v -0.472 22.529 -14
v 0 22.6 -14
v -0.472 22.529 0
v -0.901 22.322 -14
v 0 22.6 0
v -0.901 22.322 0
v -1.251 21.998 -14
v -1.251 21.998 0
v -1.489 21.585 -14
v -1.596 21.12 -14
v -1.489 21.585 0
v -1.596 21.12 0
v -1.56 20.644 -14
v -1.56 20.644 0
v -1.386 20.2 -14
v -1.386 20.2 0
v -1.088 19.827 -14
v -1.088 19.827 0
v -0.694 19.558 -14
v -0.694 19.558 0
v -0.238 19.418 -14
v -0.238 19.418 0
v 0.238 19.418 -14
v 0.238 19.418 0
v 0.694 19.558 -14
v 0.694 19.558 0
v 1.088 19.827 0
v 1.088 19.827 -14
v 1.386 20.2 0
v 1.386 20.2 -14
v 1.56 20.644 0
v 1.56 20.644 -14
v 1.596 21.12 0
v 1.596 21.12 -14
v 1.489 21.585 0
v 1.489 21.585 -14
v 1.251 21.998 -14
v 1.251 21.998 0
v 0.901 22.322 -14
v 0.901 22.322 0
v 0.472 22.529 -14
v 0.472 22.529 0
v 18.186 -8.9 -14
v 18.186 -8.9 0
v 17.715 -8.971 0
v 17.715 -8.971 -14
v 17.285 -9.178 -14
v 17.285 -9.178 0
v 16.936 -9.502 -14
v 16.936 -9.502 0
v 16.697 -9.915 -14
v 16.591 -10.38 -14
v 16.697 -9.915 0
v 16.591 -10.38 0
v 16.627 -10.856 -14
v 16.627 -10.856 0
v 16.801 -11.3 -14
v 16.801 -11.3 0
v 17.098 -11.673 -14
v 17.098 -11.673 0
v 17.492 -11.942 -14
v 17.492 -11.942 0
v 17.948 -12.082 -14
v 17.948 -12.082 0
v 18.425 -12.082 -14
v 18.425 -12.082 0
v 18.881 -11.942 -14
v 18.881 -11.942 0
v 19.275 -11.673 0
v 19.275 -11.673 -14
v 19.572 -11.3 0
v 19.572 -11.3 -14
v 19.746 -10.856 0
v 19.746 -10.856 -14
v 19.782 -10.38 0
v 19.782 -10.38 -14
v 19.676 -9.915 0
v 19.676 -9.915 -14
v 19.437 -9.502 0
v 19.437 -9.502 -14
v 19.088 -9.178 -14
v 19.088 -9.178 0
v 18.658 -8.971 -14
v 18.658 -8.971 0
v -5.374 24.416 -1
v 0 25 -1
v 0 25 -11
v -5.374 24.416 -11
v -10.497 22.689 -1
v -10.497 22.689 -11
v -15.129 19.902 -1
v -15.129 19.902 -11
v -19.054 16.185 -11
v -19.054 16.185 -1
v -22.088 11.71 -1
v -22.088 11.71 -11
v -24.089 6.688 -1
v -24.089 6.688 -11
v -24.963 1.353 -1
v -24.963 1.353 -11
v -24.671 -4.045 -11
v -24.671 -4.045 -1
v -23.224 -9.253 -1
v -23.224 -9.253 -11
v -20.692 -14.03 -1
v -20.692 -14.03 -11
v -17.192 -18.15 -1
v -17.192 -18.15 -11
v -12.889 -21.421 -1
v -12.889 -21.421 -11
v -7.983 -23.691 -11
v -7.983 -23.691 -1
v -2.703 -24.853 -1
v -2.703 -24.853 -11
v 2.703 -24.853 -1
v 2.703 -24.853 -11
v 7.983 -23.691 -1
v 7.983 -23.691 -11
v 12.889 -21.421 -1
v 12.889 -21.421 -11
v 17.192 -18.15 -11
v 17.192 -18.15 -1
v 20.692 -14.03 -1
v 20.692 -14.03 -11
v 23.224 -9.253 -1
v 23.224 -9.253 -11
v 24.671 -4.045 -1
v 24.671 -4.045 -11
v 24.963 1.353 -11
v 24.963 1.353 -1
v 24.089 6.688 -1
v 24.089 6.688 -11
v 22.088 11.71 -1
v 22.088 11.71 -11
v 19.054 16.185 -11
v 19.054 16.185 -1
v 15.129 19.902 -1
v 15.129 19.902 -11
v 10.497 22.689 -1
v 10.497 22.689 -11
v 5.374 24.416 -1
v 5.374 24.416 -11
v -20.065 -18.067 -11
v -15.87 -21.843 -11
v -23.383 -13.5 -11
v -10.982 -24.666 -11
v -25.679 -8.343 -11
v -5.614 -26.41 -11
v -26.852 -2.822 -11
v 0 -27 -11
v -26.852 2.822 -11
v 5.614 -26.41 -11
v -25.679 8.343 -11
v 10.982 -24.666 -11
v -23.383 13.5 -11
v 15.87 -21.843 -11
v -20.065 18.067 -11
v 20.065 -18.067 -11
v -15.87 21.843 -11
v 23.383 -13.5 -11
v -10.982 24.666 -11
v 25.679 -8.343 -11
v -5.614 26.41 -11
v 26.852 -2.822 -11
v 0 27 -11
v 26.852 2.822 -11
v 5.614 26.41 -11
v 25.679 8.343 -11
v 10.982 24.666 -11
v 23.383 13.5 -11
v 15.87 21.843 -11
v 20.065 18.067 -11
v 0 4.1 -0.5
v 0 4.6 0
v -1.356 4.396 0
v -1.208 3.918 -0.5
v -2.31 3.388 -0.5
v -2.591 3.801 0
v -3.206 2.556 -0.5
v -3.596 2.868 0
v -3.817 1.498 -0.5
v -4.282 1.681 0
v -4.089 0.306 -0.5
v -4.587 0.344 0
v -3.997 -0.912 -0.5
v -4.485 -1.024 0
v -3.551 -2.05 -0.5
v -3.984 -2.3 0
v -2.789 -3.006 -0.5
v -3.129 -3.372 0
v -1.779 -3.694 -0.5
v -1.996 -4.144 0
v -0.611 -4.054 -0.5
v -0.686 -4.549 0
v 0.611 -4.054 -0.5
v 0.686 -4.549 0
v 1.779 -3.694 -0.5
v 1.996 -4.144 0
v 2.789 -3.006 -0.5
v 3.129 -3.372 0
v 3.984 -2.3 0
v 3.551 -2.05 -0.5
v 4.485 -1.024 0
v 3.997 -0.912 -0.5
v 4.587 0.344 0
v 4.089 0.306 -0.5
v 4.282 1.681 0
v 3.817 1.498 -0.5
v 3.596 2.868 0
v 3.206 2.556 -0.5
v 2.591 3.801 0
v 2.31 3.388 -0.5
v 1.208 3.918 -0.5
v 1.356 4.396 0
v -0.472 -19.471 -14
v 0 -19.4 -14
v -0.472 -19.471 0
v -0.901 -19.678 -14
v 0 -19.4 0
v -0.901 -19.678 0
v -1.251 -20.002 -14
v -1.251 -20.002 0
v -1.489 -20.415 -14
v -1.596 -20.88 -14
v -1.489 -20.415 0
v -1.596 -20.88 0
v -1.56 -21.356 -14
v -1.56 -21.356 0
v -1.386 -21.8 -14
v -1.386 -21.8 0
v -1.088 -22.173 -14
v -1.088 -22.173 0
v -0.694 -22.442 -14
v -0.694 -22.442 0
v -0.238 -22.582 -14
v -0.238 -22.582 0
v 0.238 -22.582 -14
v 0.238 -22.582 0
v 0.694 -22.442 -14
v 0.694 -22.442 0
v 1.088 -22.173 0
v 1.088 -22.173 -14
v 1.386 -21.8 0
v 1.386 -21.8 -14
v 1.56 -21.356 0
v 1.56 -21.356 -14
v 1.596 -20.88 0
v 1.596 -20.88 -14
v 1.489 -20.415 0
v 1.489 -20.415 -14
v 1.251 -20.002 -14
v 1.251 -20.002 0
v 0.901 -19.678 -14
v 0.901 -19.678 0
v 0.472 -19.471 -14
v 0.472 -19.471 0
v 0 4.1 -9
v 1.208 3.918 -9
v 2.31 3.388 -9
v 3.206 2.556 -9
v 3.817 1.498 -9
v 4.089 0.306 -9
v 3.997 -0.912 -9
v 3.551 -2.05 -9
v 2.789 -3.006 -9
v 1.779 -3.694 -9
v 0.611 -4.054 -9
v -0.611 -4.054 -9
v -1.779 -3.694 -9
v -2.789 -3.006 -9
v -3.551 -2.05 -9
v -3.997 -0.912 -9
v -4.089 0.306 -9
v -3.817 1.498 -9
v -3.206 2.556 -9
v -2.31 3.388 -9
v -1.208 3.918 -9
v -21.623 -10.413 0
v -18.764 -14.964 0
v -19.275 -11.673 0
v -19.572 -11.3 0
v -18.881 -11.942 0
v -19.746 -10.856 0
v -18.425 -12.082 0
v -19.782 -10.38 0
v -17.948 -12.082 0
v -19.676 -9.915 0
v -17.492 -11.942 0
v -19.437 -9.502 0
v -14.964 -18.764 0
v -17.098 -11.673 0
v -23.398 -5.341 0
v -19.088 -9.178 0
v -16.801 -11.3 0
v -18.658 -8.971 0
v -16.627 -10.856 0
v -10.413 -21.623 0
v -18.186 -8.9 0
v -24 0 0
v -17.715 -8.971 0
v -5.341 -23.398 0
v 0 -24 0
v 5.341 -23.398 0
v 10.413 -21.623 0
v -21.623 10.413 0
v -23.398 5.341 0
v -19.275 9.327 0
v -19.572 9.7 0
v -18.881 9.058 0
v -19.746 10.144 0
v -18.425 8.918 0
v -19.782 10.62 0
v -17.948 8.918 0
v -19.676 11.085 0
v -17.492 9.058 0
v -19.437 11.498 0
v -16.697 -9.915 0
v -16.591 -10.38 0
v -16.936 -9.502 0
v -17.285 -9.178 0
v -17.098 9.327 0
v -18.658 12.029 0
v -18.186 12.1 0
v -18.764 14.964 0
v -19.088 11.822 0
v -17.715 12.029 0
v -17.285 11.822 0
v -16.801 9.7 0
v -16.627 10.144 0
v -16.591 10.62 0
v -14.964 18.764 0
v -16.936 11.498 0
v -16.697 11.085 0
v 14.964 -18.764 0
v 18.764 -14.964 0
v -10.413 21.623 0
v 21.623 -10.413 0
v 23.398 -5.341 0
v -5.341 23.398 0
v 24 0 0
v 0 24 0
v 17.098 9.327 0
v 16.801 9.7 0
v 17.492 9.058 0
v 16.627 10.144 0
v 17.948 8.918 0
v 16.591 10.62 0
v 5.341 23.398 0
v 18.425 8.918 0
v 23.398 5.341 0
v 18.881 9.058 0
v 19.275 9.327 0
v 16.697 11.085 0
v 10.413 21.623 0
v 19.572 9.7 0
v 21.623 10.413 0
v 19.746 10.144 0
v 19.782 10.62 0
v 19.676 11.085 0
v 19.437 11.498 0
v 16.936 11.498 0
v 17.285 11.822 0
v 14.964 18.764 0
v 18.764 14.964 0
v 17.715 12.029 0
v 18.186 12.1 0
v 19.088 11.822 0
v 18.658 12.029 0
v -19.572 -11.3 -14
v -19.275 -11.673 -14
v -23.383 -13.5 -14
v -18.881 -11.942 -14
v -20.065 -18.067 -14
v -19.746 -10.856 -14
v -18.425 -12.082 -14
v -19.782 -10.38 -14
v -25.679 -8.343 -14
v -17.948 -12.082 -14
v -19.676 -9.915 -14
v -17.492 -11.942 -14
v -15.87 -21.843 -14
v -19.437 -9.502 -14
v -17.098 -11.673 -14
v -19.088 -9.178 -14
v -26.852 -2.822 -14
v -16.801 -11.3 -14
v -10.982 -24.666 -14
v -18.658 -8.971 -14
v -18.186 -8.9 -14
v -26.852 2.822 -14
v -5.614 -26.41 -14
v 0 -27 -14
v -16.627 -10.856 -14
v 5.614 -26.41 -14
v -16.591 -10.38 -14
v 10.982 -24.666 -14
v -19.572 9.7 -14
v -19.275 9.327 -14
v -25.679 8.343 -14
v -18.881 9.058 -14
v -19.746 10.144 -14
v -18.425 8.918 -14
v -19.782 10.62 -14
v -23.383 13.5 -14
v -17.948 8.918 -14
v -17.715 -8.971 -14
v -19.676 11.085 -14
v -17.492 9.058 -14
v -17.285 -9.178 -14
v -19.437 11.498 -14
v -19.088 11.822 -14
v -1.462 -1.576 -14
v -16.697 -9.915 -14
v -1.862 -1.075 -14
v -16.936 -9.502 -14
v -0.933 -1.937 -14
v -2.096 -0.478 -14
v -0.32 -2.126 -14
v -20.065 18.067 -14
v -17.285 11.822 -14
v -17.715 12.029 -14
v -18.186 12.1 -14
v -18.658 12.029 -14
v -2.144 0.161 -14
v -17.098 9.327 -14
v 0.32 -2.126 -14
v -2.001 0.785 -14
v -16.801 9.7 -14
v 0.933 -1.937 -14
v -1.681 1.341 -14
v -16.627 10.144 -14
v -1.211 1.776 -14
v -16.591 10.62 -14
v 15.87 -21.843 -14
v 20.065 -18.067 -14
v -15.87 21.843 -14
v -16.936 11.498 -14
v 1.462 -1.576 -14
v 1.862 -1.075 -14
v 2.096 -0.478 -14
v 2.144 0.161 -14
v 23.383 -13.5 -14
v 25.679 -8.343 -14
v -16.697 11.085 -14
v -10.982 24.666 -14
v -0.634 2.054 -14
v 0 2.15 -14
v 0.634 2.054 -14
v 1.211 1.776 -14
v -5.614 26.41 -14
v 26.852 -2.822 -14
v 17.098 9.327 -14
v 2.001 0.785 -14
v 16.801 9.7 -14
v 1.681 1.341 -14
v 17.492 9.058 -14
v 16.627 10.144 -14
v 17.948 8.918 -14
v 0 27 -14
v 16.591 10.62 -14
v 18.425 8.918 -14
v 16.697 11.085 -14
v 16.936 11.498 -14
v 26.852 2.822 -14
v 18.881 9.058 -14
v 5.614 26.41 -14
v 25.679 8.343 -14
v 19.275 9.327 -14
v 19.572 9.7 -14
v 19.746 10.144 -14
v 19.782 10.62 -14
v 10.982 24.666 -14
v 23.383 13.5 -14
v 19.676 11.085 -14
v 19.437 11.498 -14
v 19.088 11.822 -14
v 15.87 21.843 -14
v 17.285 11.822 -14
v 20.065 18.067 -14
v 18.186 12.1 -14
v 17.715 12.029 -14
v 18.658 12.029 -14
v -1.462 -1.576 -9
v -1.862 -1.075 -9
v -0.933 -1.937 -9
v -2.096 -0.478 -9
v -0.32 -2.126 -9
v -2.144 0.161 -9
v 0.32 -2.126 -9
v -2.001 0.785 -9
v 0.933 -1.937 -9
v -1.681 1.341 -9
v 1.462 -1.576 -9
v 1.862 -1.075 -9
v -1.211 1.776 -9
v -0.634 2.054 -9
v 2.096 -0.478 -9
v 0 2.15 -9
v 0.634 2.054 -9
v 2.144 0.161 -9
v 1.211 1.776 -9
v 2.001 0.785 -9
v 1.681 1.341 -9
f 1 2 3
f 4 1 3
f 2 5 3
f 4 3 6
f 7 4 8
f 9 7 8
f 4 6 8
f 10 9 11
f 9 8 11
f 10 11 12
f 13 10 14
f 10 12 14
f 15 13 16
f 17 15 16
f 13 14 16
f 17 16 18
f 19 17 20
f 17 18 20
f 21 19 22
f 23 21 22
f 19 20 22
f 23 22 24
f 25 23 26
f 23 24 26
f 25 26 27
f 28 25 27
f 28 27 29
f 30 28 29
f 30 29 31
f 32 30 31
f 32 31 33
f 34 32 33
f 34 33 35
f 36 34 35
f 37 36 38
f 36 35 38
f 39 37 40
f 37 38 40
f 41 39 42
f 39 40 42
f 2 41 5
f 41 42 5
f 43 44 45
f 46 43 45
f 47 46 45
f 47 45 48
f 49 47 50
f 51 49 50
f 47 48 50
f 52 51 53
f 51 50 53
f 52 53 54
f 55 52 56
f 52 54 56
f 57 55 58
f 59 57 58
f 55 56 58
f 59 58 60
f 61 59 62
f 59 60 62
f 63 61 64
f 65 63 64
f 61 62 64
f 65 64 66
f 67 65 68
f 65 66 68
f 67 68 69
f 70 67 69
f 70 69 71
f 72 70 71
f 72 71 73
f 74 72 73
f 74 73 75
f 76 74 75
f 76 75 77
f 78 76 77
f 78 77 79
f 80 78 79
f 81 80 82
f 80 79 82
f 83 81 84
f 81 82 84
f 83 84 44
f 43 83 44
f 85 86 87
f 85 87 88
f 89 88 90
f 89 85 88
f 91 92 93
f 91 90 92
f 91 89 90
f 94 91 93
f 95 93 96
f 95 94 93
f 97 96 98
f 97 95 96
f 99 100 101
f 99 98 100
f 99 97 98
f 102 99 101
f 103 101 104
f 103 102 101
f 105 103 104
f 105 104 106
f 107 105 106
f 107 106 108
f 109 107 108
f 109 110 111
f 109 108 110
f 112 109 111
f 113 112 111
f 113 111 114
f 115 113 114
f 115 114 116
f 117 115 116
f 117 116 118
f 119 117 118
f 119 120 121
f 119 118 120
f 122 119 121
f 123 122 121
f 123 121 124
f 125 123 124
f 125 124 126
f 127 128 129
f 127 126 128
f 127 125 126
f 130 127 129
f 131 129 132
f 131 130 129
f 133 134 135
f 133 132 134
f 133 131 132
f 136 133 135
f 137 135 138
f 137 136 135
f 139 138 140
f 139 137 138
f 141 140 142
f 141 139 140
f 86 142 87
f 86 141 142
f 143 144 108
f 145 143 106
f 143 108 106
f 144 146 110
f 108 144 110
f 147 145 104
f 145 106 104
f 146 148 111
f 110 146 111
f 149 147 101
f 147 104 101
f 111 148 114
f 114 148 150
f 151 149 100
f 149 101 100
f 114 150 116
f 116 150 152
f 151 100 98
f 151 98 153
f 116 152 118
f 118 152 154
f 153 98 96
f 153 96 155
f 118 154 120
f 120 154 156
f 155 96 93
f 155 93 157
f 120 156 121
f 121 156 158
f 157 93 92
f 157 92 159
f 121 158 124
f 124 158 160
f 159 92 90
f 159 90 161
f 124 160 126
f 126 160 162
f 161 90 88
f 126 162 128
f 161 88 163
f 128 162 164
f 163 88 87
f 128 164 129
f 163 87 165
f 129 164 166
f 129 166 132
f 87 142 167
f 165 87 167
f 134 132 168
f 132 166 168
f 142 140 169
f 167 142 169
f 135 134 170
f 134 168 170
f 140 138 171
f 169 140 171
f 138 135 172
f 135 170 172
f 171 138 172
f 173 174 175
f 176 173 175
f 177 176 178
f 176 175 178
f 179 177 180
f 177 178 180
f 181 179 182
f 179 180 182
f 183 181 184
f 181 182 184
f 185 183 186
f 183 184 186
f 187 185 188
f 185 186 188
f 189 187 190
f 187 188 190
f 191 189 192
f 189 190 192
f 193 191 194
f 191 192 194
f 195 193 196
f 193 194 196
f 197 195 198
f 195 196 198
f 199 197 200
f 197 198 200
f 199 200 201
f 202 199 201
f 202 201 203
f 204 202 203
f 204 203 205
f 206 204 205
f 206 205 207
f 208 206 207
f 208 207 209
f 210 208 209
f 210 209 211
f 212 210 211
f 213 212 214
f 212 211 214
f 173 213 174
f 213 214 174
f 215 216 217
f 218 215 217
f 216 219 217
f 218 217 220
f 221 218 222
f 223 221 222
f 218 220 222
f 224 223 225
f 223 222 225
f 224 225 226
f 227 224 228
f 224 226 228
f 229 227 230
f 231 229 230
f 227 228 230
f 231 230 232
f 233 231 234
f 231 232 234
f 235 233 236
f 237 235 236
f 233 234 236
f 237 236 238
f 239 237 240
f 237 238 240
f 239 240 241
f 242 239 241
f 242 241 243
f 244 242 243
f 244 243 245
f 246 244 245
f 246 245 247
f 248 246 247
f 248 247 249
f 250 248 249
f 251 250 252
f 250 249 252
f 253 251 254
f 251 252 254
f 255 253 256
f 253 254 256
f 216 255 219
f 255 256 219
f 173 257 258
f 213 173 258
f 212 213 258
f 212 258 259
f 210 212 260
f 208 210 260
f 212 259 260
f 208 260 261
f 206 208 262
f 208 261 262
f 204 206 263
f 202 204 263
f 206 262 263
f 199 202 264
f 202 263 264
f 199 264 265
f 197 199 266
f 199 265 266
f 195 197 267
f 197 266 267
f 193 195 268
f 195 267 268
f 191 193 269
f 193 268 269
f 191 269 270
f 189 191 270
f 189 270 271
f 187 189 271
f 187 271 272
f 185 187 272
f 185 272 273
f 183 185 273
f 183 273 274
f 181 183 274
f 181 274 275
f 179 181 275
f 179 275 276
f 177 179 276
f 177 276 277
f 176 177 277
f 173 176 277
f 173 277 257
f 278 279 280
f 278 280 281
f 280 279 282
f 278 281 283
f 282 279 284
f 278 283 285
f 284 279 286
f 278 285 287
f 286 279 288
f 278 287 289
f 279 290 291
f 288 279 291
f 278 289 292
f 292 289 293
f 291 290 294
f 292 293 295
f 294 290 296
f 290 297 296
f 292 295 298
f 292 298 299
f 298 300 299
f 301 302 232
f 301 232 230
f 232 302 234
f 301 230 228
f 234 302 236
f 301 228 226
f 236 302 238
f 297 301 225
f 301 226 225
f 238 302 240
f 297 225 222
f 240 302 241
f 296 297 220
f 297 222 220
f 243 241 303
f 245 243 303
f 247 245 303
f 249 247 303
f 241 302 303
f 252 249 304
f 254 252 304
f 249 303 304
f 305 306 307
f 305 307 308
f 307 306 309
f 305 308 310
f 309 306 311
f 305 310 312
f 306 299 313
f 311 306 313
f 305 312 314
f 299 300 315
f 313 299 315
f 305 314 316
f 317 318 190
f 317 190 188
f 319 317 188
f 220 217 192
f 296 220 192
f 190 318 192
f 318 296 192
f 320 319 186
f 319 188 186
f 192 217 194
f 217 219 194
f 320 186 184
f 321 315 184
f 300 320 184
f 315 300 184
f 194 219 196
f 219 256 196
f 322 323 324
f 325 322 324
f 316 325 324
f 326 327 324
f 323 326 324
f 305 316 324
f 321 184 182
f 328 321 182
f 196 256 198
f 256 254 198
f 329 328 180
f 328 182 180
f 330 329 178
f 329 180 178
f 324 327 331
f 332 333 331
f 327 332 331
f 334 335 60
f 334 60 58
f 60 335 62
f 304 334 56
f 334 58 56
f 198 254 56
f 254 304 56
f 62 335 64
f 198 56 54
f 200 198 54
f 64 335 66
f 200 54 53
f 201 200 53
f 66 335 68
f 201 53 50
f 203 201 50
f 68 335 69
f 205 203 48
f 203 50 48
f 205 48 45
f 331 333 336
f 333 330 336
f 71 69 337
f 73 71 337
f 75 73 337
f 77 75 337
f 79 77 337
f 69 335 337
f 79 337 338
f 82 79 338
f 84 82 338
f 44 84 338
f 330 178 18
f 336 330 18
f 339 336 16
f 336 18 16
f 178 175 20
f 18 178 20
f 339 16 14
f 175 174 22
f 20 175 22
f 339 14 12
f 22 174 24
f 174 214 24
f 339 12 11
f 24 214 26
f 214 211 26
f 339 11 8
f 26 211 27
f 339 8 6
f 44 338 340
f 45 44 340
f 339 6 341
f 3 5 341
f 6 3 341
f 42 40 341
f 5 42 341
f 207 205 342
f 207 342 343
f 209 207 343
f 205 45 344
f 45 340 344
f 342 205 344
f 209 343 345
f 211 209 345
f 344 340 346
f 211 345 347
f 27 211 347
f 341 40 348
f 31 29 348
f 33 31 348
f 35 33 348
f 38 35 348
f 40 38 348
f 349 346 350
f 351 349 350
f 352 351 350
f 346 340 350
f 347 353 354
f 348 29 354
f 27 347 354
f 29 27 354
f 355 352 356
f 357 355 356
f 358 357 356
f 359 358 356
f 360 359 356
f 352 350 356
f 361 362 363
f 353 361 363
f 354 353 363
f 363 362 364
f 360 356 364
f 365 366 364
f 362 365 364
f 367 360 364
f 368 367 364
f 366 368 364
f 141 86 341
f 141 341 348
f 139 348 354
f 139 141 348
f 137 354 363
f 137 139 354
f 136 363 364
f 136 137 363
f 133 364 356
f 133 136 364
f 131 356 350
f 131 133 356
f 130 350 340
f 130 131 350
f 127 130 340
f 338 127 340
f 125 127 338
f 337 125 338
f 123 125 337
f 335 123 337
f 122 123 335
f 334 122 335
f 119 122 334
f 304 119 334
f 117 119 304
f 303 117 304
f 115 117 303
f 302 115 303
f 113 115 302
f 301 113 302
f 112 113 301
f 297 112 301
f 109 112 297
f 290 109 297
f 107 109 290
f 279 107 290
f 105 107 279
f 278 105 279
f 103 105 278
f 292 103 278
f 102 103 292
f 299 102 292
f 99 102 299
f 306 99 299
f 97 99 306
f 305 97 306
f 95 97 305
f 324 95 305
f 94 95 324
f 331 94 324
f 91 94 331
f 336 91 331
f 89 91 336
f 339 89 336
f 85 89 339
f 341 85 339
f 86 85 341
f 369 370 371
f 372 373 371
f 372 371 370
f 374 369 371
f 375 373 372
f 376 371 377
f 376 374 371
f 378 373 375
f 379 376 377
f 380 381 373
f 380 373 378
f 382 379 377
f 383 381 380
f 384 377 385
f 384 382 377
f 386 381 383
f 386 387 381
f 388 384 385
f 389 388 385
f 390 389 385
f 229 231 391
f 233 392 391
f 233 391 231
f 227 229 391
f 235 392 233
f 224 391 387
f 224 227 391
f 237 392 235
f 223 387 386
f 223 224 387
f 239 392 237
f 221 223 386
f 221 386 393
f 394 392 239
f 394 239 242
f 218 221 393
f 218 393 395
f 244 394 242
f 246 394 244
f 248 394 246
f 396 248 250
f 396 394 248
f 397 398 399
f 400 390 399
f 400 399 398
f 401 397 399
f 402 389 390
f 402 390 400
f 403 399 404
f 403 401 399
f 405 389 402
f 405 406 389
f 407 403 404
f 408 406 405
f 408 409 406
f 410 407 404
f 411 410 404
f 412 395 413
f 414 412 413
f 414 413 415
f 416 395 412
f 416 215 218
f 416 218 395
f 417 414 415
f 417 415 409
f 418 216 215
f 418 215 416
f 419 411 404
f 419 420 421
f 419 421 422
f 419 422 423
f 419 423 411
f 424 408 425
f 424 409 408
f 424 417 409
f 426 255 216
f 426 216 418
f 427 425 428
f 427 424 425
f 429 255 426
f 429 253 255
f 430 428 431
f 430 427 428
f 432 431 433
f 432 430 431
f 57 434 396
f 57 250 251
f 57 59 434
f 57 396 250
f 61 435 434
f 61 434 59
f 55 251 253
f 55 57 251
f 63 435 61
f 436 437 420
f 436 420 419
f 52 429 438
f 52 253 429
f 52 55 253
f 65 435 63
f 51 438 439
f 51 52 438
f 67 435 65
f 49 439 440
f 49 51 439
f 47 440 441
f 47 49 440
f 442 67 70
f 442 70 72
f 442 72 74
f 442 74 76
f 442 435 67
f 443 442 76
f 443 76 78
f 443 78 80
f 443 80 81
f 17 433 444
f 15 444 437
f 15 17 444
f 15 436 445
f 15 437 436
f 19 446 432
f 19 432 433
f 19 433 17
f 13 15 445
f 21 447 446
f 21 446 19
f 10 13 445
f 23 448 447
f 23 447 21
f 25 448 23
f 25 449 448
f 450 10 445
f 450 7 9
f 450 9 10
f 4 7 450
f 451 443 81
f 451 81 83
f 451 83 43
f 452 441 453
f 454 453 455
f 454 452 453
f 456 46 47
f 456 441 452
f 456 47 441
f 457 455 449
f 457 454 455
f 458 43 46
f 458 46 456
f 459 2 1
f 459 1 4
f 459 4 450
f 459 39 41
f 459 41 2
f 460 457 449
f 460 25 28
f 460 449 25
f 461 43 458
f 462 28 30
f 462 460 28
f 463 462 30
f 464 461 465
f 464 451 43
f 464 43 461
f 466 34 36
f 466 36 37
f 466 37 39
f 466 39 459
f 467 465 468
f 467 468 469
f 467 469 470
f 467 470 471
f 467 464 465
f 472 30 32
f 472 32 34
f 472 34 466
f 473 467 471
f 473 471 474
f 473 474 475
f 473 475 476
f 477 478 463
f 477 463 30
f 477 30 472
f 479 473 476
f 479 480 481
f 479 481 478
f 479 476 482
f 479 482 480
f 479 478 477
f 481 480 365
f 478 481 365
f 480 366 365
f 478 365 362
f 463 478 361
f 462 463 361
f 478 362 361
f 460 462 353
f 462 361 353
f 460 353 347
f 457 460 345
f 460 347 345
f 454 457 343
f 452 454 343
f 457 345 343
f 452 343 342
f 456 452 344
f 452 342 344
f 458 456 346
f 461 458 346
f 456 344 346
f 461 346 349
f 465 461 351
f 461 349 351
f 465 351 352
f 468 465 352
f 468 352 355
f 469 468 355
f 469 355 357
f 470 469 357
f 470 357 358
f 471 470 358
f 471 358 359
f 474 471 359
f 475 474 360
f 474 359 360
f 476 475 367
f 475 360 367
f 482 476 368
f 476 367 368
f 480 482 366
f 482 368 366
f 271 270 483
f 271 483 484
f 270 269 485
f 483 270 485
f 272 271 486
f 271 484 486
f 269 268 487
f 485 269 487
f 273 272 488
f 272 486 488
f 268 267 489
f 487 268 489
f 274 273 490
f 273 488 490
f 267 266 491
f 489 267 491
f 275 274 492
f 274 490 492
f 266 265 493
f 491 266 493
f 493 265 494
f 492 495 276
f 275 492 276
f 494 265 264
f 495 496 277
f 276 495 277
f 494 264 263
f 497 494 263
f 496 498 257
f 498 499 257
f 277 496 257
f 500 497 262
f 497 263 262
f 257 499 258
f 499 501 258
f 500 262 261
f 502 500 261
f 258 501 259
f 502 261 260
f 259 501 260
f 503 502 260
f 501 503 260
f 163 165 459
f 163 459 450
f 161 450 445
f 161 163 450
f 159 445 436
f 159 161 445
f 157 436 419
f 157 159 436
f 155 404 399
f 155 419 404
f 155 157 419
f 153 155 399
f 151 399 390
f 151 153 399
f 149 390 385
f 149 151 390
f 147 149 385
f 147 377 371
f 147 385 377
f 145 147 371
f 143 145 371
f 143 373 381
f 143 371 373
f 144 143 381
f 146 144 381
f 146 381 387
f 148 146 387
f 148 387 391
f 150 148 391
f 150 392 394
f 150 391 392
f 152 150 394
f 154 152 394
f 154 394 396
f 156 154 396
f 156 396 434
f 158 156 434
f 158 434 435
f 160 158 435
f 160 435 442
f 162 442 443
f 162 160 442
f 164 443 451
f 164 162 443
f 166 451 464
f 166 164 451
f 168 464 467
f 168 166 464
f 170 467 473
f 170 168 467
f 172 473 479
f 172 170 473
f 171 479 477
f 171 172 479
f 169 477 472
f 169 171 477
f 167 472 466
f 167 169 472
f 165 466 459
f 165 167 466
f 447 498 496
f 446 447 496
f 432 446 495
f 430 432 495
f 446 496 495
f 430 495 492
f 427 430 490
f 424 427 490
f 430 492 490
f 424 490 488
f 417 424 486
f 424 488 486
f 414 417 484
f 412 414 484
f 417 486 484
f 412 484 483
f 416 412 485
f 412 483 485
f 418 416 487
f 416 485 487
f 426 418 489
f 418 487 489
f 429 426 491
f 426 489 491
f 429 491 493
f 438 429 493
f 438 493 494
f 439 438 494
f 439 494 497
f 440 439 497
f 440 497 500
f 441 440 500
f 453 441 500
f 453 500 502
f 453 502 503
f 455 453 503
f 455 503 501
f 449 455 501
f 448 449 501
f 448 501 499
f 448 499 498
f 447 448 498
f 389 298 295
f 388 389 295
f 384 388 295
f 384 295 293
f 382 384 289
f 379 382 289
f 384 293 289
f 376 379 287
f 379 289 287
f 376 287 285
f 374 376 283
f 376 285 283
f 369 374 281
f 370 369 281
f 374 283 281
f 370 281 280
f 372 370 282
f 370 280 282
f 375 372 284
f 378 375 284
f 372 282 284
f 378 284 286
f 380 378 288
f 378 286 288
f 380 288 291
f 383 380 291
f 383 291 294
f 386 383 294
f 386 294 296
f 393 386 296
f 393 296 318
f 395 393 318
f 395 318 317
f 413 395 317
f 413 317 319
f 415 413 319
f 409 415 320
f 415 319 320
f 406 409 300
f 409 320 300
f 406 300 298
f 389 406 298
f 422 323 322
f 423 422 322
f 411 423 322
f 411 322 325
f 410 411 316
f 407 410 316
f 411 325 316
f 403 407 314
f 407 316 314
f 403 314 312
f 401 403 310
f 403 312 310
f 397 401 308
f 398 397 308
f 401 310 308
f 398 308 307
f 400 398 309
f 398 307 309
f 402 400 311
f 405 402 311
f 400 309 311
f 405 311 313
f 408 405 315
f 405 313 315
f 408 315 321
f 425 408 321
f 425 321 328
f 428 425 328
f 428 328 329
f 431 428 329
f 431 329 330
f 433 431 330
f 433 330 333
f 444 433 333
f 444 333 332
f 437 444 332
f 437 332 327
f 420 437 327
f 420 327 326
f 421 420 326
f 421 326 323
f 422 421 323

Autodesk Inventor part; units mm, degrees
ref_plane "YZ Plane" through (0, 0, 0) normal (1, 0, 0) x (0, 1, 0)
ref_plane "XZ Plane" through (0, 0, 0) normal (0, 1, 0) x (-1, 0, 0)
ref_plane "XY Plane" through (0, 0, 0) normal (0, 0, 1) x (1, 0, 0)
sketch "スケッチ1" plane through (0, 0, 0) normal (1, 0, 0) x (0, 1, 0)
  line L0 (7, 0) -> (7, 0)
  line L1 (0, -9) -> (0, -14)
  line L2 (0, -14) -> (27, -14)
  line L3 (27, -14) -> (27, -11)
  line L4 (27, -11) -> (25, -11)
  line L5 (25, -11) -> (25, 0)
  line L6 (25, 0) -> (7, 0)
  line L7 (7, 0) -> (4.1, 0)
  line L8 (4.1, 0) -> (4.1, -9)
  line L9 (4.1, -9) -> (0, -9)
  point P0 (0, 0)
  dimension "d2" = 11
  dimension "d3" = 3
  dimension "d4" = 25
  dimension "d5" = 2
  dimension "d35" = 0
  dimension "d36" = 7
  dimension "d37" = 4.1
  dimension "d45" = 9
revolve "回転1" add sketch "スケッチ1" angle 360 about axis through (0, 0, -9) along (0, 0, -1)
chamfer "面取り1" distance 1 angle 45 1 edges at (0, -25, 0)
sketch "スケッチ2" plane through (0, 0, -14) normal (0, 0, -1) x (-1, 0, 0)
  point P0 (0, 0)
hole "穴1" at (0, 0, -14) direction (0, 0, 1) diameter 4.3 end through all clearance for "Socket Head Cap Screw" size "M4" standard "Ansi Metric M Profile"
sketch "スケッチ3" plane through (0, 0, -14) normal (0, 0, -1) x (-1, 0, 0)
  circle A0 centre (0, 0) radius 21
  point P0 (0, 0)
  point P1 (0, -21)
  point P2 (18.1865, -10.5)
  point P3 (18.1865, 10.5)
  point P4 (0, 21)
  point P5 (-18.1865, 10.5)
  point P6 (-18.1865, -10.5)
  dimension "d20" = 42
  dimension "d23" = 360
hole "穴2" at (0, -21, -14) at (-18.1865, -10.5, -14) at (-18.1865, 10.5, -14) at (0, 21, -14) at (18.1865, 10.5, -14) at (18.1865, -10.5, -14) direction (0, 0, 1) diameter 3.2 end through all clearance for "Socket Head Cap Screw" size "M3" standard "Ansi Metric M Profile"
chamfer "面取り4" distance 0.5 angle 45 1 edges at (0, -4.1, 0)
properties part number "base3" material "ABS プラスチック"
